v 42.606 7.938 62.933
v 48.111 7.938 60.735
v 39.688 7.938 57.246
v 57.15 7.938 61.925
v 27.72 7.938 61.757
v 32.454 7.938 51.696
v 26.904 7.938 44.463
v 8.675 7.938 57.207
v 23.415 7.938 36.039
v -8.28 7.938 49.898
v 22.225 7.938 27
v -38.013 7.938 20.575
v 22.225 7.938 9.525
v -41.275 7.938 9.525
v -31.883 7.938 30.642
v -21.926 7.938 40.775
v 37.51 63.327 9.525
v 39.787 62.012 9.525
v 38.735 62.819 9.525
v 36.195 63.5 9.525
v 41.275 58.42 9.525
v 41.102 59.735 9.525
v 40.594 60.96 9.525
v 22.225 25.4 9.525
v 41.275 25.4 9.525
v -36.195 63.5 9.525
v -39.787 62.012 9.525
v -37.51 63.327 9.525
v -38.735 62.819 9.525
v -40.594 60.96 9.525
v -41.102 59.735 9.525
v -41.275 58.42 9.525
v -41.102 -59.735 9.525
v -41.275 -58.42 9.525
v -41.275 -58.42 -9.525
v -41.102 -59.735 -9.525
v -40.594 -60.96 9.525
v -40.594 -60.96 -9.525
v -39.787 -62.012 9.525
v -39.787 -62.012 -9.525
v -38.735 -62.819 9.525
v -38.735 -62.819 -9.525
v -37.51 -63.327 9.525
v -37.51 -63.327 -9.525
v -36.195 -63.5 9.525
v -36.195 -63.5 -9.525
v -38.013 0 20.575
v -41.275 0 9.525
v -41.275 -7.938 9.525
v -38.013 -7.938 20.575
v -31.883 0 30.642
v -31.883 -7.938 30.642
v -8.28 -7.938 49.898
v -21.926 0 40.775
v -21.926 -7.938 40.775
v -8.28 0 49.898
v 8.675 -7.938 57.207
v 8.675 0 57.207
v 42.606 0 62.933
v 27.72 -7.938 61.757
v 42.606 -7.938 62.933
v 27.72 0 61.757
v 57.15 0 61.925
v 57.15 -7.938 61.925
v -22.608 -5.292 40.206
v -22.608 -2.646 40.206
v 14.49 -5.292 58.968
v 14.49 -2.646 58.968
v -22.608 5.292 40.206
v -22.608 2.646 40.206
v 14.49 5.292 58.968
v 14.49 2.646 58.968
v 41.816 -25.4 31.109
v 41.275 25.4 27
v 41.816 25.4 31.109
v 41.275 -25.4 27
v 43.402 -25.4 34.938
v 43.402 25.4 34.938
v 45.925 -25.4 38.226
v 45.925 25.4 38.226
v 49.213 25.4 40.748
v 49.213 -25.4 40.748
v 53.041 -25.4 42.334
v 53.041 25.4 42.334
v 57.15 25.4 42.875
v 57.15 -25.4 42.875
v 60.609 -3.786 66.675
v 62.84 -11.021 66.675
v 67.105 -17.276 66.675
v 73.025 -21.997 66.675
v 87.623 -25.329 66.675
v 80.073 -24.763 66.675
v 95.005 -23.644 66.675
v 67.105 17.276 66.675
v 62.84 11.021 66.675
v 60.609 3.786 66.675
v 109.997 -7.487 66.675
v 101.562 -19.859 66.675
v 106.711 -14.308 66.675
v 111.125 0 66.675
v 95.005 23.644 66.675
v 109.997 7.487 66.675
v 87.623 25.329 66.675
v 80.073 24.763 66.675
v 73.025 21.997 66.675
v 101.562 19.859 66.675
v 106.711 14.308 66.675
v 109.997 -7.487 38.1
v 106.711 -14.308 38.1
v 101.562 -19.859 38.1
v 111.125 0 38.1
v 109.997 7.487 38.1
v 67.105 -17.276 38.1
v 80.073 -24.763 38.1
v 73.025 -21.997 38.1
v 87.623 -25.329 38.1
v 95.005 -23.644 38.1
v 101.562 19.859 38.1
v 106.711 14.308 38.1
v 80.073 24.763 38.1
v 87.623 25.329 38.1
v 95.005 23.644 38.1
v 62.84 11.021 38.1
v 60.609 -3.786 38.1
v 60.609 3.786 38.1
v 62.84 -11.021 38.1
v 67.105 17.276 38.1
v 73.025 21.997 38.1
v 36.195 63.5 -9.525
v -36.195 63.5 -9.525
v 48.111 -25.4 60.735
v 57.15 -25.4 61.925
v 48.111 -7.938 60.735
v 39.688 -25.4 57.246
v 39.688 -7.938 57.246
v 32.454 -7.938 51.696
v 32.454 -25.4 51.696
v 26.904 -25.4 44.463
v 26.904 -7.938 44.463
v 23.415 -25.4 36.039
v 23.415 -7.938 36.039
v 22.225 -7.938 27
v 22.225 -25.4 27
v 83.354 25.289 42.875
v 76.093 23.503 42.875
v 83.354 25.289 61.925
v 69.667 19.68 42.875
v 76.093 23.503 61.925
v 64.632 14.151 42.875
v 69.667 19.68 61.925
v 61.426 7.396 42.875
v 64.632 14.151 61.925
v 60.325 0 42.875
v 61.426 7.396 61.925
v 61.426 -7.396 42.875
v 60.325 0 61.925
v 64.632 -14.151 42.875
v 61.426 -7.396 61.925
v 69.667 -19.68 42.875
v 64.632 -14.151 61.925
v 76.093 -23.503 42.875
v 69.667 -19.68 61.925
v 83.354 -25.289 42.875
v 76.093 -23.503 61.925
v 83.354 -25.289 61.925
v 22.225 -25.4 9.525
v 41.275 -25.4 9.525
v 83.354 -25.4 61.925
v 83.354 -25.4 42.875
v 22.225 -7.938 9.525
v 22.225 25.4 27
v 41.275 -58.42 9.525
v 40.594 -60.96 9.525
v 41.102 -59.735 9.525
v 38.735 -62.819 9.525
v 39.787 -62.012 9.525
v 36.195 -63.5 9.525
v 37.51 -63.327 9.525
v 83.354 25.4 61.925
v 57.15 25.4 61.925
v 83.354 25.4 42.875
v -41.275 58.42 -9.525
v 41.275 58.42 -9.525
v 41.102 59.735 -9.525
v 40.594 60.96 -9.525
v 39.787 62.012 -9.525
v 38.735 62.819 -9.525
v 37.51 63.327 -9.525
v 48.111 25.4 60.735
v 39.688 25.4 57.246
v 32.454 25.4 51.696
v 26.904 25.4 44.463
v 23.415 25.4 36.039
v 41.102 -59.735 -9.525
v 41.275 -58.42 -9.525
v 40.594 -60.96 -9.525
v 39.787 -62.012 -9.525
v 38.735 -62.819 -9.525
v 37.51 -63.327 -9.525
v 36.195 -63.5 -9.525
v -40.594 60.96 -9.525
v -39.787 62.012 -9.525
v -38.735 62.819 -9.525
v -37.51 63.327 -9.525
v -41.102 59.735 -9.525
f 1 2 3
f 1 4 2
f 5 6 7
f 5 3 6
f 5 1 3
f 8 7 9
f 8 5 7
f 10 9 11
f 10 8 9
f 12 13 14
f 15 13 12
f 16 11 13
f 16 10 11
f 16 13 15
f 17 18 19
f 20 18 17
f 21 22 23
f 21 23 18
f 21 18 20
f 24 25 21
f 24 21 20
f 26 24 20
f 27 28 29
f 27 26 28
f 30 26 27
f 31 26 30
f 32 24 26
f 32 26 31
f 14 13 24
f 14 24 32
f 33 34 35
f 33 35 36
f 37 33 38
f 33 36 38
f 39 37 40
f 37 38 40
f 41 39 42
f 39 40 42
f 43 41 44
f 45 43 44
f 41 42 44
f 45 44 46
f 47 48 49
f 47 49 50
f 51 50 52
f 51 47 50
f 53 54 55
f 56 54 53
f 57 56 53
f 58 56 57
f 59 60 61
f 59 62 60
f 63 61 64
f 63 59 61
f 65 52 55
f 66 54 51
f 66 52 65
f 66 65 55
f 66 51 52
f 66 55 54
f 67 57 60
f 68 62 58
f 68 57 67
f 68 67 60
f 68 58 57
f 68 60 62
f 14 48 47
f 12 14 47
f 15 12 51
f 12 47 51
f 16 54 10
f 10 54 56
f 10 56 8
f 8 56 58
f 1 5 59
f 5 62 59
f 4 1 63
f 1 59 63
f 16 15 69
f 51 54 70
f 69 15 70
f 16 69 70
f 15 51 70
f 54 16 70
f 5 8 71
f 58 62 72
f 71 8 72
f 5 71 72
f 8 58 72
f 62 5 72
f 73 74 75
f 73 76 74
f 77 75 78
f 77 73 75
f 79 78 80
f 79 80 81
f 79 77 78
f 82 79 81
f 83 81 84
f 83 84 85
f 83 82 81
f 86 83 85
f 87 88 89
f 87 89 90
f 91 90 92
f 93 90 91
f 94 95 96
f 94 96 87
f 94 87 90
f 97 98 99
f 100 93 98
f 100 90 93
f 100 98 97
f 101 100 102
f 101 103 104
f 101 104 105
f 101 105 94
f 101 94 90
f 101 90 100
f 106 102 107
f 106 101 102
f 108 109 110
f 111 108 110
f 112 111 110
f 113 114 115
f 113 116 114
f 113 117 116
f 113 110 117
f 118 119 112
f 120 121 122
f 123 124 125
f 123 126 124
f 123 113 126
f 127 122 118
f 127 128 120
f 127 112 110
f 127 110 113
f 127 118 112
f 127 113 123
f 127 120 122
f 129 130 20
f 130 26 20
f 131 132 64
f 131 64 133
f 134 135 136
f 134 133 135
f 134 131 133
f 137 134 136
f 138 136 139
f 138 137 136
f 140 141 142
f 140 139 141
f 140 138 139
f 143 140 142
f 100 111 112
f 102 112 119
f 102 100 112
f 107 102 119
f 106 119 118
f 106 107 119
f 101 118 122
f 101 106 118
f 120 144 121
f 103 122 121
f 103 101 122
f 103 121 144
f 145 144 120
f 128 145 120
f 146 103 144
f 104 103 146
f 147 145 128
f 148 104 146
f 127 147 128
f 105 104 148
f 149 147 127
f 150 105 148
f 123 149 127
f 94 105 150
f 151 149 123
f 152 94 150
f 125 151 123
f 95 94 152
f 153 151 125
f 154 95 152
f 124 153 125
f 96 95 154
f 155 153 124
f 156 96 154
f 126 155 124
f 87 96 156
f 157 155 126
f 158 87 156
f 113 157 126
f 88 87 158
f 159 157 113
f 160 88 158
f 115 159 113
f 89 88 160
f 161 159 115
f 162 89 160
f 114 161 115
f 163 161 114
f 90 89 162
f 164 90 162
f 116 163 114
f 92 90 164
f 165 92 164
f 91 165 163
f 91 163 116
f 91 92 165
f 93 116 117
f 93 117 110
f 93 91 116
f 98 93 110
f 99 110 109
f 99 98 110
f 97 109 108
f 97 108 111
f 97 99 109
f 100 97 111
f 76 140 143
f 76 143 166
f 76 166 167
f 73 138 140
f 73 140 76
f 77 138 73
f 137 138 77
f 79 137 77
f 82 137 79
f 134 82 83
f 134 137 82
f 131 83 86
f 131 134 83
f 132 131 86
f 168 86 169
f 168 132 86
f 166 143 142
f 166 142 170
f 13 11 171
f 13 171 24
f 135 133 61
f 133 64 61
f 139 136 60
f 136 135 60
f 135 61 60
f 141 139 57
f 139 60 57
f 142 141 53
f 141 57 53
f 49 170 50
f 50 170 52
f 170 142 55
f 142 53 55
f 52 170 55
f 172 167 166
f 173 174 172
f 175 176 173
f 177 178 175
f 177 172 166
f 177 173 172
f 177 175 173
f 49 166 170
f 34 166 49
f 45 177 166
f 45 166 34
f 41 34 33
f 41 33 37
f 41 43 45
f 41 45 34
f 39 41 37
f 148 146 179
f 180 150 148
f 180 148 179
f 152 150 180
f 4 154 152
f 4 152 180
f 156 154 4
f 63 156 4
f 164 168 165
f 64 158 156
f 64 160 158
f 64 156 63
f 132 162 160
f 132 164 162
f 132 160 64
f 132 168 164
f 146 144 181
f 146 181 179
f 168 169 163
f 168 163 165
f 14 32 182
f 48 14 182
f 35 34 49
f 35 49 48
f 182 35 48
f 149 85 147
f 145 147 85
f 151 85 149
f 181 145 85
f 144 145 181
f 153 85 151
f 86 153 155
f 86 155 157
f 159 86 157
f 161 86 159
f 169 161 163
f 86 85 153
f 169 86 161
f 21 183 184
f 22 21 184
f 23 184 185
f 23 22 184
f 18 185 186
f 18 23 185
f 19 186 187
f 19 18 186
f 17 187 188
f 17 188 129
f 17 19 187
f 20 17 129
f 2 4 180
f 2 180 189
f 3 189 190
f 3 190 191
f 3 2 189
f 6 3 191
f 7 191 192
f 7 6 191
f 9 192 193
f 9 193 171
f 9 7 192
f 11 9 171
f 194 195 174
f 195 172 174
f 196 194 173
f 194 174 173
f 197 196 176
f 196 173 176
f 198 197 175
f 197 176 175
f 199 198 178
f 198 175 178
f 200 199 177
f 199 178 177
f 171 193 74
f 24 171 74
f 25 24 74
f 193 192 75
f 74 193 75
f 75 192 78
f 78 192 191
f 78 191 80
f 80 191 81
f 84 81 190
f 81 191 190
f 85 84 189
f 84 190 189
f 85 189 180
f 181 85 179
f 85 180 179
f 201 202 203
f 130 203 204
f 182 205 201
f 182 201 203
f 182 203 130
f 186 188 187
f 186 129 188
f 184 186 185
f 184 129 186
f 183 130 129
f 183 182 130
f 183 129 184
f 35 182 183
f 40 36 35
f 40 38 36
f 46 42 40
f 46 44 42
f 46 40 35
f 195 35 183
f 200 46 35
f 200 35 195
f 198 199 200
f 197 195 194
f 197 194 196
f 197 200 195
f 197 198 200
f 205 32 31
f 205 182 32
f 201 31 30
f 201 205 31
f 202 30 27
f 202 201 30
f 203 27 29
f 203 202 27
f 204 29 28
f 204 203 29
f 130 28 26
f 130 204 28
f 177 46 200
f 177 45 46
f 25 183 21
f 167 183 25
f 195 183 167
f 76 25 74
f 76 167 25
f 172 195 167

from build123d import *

# Parameters (mm, degrees)
F1_DEPTH = 63.5
F0_W     = 23.0290793641
F0_H     = 19.05
F2_DEPTH = 25.4
F3_DEPTH = 7.9375
F5_R     = 5.08


with BuildPart() as f1:
    # F0 (on Front) → F1 (new body, symmetric)
    with BuildSketch(Plane.XZ):
        Polygon((-41.275, 9.525), (-41.275, -9.525), (41.275, -9.525), (41.275, 9.525), (22.225, 9.525), align=None)
    extrude(amount=F1_DEPTH, both=True)

    # F0 (on Front) → F2 (join, symmetric)
    with BuildSketch(Plane.XZ):
        with Locations((71.839539682, 52.4002)):
            Rectangle(F0_W, F0_H)
        with BuildLine():
            Line((22.225, 9.525), (41.275, 9.525))
            Line((41.275, 9.525), (41.275, 27.0002))
            ThreePointArc((41.275, 27.0002), (45.9246798487, 38.2255201513), (57.15, 42.8752))
            Line((57.15, 42.8752), (60.325, 42.8752))
            Line((60.325, 42.8752), (60.325, 61.9252))
            Line((60.325, 61.9252), (57.15, 61.9252))
            ThreePointArc((57.15, 61.9252), (32.4542956671, 51.6959043329), (22.225, 27.0002))
            Line((22.225, 27.0002), (22.225, 9.525))
        make_face()
    extrude(amount=F2_DEPTH, both=True)

    # F0 (on Front) → F3 (join, symmetric)
    with BuildSketch(Plane.XZ):
        with BuildLine():
            add(Edge.make_bspline(
                [(-41.275, 9.525), (-36.1126549542, 44.8696576059), (15.9992650151, 68.1667476892), (57.15, 61.9252)],
                knots=[0, 0, 0, 0, 111.5045361635, 111.5045361635, 111.5045361635, 111.5045361635], degree=3))
            Line((-41.275, 9.525), (22.225, 9.525))
            Line((22.225, 9.525), (22.225, 27.0002))
            ThreePointArc((22.225, 27.0002), (32.4542956671, 51.6959043329), (57.15, 61.9252))
        make_face()
    extrude(amount=F3_DEPTH, both=True)

    # F0 (on Front) → F4 (revolve)
    with BuildSketch(Plane.XZ):
        Polygon((111.125, 66.675), (85.725, 66.675), (85.725, 52.3875), (85.725, 38.1), (111.125, 38.1), align=None)
    revolve(axis=Axis((85.725, 0, 45.24375), (0, 0, 1)))

    # F5
    f5_edges = [f1.edges().sort_by_distance(p)[0] for p in [
        (-41.275, -63.5, 0),
        (41.275, -63.5, 0),
        (41.275, 63.5, 0),
        (-41.275, 63.5, 0),
    ]]
    fillet(f5_edges, radius=F5_R)


solid = f1.part
